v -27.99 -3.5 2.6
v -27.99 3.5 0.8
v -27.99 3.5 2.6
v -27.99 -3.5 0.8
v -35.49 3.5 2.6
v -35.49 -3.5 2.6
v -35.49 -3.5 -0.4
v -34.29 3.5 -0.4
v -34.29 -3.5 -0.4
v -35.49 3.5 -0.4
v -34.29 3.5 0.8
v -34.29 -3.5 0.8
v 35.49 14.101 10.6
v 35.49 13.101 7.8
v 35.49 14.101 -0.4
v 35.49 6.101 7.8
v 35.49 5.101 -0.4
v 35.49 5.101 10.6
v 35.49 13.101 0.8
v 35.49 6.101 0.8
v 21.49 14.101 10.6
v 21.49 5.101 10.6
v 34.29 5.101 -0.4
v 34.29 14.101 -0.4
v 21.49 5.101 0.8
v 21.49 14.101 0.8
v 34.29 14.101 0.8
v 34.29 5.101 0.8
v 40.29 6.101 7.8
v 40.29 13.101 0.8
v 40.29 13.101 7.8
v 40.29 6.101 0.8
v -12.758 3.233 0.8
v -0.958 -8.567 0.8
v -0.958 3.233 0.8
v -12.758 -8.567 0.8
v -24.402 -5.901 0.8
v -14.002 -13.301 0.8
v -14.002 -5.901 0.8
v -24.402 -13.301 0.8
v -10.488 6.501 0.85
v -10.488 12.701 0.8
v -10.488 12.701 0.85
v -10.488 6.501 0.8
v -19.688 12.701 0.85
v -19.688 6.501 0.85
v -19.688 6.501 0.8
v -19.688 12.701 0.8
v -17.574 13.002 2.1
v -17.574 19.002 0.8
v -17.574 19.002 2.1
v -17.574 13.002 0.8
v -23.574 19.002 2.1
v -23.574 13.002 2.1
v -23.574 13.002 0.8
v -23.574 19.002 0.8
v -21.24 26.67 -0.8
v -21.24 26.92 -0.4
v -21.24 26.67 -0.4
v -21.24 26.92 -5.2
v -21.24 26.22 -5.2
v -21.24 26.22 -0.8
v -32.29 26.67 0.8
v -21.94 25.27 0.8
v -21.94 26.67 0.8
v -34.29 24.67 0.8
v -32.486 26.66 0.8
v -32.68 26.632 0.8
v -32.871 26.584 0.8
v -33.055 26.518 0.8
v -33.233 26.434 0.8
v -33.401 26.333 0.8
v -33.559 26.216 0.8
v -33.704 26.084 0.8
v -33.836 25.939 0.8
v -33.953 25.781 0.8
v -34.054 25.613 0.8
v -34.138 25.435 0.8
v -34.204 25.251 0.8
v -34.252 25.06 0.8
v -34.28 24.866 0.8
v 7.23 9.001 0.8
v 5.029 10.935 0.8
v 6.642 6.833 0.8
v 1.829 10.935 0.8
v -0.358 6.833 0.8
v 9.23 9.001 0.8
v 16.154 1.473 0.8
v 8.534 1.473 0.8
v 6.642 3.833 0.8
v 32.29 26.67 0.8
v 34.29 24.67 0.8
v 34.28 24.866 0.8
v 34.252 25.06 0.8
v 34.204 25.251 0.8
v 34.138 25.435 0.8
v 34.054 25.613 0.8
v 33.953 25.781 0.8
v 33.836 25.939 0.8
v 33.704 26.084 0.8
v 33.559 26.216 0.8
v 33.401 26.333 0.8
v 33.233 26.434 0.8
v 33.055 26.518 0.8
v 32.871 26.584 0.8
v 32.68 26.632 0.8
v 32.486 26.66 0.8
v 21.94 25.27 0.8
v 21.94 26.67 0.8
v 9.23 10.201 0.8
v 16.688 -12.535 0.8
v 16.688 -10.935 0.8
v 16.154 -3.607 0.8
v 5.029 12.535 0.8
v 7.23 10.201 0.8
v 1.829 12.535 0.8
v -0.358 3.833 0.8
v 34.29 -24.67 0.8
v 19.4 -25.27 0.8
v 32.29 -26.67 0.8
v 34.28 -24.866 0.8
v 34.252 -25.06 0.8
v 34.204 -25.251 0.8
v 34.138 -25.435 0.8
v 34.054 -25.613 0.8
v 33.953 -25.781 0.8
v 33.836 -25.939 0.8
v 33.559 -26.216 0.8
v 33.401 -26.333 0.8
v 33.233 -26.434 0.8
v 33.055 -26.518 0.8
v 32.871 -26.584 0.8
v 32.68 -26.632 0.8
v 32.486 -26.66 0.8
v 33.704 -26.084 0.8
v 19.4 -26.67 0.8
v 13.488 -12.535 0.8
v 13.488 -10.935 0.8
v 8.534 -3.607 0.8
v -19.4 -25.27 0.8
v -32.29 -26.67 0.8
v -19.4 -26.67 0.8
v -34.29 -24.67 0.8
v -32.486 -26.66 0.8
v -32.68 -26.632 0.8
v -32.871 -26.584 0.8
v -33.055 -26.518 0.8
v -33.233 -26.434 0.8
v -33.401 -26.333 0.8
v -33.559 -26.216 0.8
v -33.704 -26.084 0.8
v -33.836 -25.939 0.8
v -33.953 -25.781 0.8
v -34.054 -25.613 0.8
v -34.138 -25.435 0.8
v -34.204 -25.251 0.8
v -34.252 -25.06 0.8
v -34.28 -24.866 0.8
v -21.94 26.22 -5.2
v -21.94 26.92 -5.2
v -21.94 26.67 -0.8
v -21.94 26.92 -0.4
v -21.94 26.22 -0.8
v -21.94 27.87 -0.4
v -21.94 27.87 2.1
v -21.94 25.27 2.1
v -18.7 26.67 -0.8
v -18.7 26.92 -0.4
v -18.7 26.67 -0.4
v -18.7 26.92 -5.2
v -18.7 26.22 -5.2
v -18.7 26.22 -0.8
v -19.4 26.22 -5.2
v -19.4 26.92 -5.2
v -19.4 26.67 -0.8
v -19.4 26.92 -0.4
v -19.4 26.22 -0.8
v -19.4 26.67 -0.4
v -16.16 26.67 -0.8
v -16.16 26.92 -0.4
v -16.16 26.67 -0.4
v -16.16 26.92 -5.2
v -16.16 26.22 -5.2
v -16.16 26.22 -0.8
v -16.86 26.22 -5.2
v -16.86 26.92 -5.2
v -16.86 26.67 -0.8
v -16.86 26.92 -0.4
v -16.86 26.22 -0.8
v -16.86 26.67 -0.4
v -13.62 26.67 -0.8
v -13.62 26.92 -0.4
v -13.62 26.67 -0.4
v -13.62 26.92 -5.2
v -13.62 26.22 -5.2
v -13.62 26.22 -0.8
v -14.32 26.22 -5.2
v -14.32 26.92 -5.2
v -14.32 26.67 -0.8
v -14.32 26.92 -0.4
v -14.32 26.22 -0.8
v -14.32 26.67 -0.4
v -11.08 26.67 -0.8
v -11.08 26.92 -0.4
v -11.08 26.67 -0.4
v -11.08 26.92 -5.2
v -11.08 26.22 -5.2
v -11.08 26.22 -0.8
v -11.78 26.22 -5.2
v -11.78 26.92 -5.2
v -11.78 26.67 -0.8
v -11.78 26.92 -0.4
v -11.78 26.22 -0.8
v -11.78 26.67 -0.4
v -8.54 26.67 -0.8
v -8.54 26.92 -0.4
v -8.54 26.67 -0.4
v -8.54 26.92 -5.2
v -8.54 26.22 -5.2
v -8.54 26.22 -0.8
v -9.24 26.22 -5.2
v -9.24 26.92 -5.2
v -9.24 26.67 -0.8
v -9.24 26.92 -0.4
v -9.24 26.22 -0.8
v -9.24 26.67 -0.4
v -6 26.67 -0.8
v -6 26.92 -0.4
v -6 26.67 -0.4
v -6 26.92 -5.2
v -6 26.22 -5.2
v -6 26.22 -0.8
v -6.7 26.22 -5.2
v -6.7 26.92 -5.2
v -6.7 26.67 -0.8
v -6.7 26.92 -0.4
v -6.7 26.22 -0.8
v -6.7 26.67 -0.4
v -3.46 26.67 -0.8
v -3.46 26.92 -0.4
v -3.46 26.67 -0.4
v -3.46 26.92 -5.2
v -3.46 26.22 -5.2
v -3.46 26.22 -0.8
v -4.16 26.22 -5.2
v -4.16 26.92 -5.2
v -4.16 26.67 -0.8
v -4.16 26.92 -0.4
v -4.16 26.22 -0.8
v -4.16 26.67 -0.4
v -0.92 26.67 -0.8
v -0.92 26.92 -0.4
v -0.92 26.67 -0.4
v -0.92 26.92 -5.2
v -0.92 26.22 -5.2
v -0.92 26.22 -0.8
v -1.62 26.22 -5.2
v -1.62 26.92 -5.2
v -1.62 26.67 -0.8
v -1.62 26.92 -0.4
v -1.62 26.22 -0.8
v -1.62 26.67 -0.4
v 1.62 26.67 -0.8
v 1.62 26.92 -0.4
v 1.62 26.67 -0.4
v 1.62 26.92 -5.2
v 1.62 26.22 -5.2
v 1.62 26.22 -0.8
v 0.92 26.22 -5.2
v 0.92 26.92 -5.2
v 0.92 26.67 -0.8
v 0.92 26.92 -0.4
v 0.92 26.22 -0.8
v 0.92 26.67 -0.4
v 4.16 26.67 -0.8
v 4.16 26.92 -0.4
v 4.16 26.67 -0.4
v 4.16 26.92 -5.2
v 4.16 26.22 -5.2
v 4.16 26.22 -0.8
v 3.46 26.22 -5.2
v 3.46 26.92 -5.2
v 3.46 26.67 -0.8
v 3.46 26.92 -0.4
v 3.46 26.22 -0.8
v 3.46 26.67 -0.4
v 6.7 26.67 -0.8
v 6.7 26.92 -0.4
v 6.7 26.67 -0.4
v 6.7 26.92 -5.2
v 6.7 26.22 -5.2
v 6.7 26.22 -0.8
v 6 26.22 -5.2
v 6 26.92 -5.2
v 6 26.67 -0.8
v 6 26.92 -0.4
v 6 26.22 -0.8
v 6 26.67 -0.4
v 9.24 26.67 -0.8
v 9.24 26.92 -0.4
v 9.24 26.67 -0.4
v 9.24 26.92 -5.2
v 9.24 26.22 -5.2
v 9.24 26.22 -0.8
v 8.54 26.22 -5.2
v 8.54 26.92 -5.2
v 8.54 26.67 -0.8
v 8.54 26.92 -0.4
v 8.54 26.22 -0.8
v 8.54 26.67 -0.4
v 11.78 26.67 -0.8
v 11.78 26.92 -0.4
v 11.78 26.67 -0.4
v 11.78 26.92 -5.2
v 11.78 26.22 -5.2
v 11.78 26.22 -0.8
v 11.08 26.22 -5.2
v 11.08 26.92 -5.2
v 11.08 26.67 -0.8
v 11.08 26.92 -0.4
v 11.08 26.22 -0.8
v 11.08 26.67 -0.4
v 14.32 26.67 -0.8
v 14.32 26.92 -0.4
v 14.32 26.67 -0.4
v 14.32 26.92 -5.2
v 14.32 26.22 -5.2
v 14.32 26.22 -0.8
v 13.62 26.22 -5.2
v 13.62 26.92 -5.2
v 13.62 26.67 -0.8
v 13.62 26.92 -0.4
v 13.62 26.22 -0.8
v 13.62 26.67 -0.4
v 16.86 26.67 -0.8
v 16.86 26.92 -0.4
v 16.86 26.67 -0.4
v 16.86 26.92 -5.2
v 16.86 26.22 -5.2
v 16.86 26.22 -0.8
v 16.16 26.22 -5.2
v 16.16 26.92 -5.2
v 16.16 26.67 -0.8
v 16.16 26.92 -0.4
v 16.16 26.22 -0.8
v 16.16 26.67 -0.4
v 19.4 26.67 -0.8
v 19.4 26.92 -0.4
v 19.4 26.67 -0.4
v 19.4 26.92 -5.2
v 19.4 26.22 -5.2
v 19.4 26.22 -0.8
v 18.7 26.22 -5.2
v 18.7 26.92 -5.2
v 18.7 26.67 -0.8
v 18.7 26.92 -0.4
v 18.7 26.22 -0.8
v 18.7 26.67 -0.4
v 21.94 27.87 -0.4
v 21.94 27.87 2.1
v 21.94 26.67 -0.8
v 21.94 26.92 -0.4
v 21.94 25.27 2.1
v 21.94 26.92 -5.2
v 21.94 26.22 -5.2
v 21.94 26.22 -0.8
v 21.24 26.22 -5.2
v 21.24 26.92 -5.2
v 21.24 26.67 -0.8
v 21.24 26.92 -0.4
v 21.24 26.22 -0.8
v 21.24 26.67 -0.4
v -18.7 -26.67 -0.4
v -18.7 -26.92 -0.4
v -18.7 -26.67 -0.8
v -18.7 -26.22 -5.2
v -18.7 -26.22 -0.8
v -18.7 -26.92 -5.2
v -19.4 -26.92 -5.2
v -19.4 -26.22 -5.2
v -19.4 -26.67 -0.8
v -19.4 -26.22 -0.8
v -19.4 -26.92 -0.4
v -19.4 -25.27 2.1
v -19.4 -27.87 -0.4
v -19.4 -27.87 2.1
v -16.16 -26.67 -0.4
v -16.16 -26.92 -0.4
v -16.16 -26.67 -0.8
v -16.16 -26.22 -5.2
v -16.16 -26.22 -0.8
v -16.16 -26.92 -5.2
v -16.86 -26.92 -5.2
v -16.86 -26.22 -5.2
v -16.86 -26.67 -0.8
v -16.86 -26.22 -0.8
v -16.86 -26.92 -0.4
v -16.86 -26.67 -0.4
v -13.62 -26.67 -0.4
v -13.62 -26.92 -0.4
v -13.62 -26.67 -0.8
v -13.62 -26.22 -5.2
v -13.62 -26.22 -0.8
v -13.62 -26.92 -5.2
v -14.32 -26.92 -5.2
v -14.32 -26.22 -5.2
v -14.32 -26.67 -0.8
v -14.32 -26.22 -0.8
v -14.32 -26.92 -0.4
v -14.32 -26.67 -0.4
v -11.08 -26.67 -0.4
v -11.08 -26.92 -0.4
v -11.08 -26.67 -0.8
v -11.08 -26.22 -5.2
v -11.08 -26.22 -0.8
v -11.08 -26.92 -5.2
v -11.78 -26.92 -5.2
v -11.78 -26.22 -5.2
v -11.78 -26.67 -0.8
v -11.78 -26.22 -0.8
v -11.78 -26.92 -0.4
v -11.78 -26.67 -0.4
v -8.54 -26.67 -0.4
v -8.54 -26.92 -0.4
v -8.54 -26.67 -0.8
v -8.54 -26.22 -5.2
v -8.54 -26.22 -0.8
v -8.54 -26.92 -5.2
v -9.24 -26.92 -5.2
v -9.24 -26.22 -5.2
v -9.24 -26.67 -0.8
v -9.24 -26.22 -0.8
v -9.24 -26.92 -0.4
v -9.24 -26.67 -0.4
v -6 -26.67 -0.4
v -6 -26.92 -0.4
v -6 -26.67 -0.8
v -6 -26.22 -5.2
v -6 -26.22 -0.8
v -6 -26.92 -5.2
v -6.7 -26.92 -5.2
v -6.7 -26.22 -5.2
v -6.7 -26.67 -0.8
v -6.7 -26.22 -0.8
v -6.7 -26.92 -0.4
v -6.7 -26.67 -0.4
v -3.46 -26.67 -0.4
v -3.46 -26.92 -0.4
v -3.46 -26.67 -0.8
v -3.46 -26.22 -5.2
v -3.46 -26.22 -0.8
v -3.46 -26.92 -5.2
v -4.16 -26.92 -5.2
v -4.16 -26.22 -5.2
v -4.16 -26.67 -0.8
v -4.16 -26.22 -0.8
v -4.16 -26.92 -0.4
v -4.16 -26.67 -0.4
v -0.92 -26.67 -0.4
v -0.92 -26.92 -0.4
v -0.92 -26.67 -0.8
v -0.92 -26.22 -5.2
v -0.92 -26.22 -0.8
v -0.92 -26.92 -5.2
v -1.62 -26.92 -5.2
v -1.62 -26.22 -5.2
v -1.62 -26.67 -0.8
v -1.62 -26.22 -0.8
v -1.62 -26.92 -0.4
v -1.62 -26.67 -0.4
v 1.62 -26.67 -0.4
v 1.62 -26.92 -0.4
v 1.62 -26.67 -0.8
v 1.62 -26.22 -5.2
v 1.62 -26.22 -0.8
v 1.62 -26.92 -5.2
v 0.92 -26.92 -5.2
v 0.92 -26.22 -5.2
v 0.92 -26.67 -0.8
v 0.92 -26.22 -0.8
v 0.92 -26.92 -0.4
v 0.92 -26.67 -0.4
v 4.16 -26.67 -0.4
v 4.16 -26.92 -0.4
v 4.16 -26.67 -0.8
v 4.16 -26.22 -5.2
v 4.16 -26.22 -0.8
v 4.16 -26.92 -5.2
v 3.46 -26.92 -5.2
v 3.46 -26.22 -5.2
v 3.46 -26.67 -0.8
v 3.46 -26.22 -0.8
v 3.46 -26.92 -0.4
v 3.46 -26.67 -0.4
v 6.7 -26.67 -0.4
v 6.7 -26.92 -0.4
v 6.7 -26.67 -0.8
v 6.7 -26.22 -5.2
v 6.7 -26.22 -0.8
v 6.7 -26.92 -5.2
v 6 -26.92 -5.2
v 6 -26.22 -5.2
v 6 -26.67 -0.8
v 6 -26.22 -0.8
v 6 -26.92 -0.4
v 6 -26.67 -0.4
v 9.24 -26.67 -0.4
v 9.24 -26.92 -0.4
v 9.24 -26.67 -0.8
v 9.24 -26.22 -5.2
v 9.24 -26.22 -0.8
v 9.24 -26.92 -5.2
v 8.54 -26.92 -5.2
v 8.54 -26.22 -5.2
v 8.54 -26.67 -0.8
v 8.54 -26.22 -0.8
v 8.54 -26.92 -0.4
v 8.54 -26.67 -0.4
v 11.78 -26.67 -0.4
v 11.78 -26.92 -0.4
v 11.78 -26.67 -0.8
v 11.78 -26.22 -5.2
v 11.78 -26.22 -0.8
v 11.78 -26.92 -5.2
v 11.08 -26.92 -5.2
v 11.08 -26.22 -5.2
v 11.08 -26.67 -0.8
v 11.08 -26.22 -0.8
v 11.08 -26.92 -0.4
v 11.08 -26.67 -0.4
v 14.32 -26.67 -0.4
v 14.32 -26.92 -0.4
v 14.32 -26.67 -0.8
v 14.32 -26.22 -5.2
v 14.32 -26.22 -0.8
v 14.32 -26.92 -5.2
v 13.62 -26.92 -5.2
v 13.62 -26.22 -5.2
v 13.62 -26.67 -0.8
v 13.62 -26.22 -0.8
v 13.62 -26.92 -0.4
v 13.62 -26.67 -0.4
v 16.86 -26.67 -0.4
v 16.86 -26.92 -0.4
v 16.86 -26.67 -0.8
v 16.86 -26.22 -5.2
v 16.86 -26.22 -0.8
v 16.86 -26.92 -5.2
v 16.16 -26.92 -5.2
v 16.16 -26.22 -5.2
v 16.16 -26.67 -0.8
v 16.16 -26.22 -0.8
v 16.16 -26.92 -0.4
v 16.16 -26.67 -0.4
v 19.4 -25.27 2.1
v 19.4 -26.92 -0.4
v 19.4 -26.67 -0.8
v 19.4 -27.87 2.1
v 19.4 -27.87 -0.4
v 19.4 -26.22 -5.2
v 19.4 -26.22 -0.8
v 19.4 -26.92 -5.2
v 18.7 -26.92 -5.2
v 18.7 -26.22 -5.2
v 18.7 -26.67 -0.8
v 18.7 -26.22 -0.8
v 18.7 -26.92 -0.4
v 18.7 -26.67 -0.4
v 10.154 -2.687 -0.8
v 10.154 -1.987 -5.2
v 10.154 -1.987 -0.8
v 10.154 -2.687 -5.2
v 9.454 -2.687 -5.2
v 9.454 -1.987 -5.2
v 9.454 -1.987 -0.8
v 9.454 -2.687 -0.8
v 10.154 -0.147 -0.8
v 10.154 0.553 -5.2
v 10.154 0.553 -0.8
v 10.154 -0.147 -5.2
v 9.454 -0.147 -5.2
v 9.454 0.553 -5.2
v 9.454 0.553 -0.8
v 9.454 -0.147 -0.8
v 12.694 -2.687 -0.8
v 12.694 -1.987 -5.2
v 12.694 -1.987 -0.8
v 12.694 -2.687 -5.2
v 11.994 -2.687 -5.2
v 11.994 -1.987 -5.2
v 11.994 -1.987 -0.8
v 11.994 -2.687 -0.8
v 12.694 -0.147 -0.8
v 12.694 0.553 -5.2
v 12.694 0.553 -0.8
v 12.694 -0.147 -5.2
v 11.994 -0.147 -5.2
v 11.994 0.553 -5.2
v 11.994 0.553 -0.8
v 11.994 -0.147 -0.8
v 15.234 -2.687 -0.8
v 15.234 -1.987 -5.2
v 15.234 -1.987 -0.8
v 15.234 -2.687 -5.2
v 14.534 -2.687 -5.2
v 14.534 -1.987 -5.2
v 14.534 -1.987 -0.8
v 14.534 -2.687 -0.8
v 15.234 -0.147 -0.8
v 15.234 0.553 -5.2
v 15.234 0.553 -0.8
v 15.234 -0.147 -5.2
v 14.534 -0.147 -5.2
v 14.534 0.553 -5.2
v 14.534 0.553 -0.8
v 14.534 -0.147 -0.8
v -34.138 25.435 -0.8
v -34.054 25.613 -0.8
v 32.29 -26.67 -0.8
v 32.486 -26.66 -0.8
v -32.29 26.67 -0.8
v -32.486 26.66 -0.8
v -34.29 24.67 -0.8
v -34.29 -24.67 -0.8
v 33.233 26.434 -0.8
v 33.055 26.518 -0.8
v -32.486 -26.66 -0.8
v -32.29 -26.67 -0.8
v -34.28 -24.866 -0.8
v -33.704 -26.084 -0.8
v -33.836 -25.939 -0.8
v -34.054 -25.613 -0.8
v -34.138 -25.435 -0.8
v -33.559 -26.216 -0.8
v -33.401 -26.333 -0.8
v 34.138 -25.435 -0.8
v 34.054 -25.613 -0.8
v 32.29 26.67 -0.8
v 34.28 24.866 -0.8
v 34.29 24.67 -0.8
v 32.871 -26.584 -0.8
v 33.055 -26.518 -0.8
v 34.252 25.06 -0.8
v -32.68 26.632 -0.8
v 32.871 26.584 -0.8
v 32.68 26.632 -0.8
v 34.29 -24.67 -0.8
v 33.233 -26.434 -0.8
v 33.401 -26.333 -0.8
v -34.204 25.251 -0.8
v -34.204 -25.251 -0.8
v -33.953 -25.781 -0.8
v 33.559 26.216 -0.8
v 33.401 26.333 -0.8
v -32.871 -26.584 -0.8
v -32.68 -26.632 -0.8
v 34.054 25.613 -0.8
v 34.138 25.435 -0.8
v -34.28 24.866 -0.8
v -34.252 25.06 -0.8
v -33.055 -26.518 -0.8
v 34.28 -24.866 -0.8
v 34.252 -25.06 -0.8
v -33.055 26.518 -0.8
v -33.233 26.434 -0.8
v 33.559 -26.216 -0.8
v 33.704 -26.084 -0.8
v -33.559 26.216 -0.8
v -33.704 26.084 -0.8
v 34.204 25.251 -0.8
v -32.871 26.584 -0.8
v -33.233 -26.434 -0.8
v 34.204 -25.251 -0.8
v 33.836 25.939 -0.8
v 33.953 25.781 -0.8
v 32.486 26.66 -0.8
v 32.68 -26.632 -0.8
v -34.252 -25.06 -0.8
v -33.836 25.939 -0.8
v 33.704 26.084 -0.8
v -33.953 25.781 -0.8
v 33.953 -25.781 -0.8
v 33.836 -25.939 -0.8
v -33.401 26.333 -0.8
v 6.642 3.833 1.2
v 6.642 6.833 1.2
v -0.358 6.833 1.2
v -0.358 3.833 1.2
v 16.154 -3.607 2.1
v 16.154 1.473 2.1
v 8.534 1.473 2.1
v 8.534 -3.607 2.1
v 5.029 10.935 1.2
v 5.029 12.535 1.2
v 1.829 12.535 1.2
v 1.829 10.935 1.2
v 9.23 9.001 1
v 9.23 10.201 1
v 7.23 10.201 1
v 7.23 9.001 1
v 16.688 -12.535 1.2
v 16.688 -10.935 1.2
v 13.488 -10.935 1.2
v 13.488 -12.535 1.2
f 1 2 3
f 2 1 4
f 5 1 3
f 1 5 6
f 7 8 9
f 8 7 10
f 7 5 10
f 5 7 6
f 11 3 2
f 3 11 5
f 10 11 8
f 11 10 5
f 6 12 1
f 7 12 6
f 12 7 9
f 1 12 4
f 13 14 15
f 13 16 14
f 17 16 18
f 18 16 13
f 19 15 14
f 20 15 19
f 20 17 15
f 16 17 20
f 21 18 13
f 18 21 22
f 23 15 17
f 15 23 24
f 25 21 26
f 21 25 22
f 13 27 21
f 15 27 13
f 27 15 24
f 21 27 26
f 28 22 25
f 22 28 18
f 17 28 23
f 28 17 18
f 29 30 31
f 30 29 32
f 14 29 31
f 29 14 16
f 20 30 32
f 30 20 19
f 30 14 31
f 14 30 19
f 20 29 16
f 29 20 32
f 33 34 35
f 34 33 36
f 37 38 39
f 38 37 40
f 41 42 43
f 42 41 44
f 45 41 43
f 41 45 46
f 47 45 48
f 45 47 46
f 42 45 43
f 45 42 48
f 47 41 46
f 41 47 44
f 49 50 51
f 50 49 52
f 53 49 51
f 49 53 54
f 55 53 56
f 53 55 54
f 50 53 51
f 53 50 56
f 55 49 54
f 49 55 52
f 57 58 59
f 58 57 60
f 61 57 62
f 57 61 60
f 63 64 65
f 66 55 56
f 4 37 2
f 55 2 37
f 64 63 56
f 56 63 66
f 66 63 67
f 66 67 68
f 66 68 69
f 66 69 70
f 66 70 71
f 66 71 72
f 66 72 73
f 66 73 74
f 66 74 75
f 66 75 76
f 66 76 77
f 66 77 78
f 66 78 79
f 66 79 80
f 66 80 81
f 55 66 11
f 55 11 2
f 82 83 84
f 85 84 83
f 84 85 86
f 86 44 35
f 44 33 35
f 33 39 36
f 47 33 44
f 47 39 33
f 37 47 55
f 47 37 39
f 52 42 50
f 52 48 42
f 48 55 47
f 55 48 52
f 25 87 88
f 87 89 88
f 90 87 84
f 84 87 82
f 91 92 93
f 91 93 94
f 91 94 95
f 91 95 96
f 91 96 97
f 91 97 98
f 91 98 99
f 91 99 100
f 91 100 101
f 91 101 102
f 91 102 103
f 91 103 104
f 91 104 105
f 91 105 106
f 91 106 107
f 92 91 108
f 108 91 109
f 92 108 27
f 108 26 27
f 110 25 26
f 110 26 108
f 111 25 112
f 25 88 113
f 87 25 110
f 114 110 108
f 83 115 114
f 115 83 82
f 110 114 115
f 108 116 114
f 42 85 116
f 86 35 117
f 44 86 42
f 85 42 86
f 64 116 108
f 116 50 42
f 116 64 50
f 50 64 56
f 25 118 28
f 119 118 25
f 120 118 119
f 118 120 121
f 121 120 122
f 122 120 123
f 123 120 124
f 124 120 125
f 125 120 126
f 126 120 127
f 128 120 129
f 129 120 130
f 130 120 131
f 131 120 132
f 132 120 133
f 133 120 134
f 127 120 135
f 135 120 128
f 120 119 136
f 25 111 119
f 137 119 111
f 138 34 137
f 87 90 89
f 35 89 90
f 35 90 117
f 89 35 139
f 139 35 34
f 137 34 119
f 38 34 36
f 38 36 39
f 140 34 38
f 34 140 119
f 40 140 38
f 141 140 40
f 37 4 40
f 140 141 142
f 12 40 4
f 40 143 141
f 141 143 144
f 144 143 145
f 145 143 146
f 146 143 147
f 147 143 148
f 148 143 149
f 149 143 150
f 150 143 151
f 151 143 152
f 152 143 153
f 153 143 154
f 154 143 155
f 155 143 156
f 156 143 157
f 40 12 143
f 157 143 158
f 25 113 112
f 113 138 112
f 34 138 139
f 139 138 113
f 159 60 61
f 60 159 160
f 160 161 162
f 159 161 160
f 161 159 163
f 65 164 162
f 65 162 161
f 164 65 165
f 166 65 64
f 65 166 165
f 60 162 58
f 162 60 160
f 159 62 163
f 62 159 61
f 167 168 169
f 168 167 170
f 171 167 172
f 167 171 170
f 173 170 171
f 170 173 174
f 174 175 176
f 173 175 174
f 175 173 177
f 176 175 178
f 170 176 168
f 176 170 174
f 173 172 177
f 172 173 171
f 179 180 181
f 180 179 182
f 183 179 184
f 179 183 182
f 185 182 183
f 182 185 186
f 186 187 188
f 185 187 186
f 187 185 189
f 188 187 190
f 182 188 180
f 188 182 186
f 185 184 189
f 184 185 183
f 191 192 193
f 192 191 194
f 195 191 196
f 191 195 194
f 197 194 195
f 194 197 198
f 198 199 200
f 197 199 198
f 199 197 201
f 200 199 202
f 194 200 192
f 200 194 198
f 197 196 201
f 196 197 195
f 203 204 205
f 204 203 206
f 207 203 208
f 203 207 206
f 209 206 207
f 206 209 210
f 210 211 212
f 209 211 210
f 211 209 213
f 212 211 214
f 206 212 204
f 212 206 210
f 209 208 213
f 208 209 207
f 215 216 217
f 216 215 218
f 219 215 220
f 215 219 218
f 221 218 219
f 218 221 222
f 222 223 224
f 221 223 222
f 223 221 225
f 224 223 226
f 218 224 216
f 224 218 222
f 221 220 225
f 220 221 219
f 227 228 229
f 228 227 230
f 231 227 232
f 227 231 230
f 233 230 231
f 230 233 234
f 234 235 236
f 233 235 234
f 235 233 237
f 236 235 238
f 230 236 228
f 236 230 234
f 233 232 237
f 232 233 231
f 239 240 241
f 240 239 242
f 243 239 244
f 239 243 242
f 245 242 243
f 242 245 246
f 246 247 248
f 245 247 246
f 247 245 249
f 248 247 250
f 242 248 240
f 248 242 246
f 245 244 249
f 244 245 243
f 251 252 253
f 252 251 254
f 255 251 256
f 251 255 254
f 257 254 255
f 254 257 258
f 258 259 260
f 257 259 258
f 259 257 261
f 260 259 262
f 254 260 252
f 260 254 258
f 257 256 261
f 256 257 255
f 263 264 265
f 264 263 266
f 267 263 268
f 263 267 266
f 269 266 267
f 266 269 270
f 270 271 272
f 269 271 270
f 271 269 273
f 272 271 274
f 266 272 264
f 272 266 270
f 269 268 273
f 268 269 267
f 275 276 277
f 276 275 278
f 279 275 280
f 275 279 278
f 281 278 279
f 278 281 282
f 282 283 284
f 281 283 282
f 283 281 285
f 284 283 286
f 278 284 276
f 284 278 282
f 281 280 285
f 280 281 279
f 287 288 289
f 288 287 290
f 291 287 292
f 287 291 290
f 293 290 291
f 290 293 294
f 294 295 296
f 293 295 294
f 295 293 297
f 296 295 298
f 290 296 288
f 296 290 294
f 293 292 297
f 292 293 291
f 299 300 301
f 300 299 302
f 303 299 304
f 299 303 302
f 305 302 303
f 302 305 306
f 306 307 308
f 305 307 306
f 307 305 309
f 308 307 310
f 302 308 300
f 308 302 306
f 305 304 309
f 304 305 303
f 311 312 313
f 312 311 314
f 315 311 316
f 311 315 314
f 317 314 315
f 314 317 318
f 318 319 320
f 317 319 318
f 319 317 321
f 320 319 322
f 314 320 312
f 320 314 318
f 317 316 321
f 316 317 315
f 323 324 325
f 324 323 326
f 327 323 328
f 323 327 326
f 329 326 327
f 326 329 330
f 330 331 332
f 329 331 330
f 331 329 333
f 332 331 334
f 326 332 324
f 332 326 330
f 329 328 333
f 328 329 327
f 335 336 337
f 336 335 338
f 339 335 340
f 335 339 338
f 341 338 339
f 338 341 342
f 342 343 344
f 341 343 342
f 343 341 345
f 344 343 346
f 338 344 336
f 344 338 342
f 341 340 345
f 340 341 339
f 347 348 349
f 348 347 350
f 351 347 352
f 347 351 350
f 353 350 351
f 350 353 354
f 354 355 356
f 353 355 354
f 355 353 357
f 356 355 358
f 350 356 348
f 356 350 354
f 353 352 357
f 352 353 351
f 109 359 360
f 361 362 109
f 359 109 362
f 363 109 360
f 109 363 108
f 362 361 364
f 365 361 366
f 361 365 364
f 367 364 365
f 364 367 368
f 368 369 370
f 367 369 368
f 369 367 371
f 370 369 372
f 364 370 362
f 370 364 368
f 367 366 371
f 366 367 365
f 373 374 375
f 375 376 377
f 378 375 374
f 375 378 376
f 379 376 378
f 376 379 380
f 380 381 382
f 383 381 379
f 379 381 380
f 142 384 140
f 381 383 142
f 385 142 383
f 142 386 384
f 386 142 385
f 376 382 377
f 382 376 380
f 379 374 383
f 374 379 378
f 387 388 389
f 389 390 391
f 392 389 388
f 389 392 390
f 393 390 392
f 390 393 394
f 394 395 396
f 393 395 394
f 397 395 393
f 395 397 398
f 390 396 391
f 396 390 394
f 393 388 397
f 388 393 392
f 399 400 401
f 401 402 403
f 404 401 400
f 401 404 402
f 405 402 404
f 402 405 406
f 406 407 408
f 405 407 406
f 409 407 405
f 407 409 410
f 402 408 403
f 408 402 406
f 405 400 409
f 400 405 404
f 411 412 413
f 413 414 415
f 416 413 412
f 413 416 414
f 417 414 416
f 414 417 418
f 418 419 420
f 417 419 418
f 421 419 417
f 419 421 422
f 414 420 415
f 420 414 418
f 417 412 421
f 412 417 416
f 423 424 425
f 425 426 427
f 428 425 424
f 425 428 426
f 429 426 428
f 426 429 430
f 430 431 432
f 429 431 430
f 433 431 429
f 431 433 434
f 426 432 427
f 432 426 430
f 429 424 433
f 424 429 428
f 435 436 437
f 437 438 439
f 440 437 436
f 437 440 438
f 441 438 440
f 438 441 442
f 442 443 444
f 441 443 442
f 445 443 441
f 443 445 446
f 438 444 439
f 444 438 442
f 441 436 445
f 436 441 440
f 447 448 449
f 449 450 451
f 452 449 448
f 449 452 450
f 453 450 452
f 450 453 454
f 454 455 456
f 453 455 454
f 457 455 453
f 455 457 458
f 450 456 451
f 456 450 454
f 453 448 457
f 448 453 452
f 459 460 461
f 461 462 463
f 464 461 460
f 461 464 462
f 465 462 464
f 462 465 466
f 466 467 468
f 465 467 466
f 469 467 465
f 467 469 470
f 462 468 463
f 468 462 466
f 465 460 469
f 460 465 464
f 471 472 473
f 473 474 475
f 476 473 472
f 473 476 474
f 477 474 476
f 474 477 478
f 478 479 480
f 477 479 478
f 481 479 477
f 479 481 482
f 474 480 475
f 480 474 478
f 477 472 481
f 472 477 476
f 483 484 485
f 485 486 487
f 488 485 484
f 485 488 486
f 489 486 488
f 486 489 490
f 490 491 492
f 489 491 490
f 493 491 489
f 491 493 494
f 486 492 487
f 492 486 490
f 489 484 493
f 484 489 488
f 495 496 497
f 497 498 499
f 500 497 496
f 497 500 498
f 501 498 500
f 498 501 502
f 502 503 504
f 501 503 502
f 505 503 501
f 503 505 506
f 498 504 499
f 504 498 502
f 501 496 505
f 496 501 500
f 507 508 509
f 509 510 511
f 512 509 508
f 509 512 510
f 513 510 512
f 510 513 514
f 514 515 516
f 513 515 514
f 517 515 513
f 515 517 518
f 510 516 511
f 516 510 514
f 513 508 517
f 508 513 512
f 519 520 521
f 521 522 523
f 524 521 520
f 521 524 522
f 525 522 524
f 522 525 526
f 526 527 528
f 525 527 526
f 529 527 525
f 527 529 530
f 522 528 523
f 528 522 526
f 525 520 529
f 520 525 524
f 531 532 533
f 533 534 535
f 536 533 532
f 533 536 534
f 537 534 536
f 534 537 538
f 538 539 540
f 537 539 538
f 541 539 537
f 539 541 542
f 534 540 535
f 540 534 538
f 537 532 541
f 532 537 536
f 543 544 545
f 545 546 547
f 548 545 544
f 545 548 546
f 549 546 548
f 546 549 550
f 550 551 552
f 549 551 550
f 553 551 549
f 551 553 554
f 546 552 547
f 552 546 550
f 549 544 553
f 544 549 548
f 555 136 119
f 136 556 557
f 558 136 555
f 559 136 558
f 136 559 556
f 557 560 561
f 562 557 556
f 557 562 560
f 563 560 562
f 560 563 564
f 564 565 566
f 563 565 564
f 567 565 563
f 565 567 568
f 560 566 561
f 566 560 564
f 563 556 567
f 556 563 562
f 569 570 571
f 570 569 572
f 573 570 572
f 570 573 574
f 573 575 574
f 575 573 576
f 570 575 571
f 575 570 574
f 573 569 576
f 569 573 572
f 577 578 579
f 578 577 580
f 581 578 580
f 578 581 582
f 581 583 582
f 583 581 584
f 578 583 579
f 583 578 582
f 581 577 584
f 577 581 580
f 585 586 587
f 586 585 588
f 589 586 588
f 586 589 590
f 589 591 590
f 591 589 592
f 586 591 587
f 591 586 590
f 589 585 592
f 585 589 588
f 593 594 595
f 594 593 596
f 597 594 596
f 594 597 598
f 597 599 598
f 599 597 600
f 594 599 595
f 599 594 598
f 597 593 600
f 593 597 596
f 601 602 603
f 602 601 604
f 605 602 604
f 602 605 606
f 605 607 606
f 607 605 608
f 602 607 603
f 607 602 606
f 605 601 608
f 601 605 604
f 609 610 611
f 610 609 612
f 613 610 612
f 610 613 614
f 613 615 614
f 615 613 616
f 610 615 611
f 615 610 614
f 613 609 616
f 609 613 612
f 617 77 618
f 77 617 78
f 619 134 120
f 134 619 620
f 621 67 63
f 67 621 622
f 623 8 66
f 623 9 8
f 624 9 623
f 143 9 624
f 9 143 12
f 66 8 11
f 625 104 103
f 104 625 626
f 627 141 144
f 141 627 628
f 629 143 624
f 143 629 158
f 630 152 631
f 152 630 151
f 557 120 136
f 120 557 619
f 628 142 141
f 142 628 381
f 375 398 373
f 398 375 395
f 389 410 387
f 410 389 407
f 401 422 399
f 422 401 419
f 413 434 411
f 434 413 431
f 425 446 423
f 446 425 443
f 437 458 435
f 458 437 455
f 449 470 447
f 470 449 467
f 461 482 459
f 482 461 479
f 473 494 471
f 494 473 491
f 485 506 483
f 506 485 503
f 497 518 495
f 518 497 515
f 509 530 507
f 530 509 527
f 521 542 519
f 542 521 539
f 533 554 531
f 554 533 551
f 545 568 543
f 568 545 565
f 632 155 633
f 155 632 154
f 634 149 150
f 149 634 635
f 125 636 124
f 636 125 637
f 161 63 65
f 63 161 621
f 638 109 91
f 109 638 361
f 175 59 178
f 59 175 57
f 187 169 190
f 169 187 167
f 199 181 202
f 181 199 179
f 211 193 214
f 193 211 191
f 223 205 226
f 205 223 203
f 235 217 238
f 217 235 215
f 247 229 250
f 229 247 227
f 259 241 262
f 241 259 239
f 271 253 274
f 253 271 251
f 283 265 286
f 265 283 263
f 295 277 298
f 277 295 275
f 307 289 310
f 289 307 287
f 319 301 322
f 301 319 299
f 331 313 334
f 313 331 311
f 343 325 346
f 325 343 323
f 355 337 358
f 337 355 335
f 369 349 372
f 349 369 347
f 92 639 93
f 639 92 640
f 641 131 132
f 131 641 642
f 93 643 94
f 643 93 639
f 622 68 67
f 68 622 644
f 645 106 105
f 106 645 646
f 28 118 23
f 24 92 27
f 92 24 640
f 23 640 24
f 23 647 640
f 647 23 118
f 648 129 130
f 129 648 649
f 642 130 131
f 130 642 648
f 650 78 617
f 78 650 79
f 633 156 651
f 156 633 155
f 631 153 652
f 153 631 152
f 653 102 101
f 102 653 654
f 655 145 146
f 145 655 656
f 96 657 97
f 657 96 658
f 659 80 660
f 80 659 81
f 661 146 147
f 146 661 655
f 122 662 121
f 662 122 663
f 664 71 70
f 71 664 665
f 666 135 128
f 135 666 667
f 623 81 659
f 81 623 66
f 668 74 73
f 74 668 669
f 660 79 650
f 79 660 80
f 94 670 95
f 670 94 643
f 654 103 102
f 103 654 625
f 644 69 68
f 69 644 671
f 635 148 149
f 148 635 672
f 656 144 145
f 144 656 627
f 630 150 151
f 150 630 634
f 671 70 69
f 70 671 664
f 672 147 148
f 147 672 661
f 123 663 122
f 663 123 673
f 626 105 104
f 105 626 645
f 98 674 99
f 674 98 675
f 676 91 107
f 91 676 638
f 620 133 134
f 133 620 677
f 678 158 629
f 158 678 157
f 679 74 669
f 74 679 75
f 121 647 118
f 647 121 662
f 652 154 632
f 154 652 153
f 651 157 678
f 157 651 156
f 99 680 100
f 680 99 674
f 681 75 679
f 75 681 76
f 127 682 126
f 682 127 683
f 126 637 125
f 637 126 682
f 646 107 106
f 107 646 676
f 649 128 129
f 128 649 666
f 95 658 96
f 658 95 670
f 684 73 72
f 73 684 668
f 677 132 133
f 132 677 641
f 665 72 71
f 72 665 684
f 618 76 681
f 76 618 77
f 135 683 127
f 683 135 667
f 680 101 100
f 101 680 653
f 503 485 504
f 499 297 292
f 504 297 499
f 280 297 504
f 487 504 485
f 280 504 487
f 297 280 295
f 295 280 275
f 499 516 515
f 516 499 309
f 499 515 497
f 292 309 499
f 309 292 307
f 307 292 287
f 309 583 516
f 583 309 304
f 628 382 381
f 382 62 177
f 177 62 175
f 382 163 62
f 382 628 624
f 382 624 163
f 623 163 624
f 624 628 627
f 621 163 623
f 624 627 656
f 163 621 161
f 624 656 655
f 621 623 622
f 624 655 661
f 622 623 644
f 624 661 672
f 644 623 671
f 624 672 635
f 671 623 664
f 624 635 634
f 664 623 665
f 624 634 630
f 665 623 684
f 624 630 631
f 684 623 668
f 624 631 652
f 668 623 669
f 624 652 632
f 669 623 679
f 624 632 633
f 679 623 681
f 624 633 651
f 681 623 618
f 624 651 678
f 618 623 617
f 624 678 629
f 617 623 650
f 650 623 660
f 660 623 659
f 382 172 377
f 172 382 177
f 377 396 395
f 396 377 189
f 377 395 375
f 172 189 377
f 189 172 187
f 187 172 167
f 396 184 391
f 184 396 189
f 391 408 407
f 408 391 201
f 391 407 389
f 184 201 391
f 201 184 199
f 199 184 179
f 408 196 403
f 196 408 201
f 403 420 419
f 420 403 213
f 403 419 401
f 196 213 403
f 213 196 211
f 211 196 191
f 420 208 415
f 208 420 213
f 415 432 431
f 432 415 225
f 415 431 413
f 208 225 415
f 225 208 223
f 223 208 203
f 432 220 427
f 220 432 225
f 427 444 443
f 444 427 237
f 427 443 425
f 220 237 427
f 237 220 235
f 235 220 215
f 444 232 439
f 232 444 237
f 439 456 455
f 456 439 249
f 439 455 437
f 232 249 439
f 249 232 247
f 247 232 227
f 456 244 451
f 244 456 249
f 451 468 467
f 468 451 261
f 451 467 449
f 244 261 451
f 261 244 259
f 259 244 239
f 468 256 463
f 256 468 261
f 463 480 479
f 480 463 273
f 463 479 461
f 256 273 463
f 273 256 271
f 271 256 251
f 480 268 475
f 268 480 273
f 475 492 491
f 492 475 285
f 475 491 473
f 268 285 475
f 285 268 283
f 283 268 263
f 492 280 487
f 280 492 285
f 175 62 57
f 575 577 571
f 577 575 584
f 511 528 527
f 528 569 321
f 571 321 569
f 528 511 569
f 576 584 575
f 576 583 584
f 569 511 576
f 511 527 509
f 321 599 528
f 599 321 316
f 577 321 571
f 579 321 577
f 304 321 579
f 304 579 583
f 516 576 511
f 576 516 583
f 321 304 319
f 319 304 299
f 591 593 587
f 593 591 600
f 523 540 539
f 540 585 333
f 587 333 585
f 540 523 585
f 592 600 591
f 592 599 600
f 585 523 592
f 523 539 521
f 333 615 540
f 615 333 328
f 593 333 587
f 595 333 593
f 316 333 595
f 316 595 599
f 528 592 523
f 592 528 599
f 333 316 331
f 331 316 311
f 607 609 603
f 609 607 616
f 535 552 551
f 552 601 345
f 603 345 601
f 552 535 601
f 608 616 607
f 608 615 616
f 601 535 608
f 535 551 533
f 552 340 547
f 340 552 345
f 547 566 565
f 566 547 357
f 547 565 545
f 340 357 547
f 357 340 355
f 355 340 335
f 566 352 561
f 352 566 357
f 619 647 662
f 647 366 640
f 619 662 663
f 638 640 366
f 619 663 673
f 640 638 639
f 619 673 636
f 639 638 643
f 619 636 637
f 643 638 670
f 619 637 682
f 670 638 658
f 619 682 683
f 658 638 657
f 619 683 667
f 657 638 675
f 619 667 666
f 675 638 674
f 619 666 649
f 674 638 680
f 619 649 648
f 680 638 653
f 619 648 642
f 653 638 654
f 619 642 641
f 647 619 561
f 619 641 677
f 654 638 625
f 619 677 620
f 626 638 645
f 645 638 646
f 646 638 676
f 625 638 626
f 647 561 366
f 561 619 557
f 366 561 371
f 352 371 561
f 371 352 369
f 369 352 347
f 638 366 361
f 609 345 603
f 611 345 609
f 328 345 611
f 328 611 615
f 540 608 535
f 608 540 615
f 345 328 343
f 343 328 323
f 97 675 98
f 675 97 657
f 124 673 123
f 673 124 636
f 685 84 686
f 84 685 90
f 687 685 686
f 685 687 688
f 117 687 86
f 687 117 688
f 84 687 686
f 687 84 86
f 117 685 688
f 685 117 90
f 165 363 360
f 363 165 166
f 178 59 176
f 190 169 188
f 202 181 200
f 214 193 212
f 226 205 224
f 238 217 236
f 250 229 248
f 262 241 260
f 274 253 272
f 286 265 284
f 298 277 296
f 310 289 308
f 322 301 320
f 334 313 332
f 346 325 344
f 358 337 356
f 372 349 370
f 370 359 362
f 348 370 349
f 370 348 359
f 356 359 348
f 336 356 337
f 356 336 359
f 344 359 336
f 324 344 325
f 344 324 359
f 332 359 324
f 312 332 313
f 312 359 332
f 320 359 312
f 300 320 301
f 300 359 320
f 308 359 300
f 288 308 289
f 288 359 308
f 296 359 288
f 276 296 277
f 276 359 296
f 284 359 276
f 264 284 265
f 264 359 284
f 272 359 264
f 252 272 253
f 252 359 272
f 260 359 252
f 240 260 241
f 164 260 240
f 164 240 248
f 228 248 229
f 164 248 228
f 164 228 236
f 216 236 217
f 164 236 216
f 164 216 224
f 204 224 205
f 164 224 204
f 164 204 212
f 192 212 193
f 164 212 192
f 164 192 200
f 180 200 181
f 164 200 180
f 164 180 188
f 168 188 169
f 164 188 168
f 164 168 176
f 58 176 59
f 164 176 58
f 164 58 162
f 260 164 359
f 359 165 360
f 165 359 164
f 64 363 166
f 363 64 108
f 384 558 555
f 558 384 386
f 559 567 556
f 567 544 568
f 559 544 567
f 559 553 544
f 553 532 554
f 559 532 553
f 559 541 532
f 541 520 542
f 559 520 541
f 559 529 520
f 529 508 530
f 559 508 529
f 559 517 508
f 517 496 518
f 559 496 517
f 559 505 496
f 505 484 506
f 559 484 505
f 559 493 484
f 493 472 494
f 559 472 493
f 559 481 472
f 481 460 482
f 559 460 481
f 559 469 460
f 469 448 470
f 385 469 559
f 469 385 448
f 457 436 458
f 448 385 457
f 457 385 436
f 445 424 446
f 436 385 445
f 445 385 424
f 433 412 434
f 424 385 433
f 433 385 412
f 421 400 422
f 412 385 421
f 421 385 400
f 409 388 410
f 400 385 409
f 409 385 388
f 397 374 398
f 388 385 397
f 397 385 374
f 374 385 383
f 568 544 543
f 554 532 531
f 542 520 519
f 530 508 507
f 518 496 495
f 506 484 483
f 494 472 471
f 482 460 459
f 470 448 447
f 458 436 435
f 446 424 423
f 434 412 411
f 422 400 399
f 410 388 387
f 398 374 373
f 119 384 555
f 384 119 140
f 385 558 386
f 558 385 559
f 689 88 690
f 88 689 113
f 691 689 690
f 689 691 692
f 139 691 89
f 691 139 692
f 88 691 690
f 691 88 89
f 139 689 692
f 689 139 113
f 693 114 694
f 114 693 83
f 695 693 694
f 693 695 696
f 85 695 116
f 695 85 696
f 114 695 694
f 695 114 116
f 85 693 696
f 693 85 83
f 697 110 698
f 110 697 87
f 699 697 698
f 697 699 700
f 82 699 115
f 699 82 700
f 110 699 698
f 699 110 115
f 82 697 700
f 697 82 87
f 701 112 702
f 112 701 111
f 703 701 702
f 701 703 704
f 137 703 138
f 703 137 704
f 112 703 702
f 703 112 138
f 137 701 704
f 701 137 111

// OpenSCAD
// Microcontroller development board (Arduino Leonardo-style approximation)
// Target PCB size: 68.58mm x 53.34mm x 1.6mm
// Structural fixes:
// - Ensure header pins are NOT floating: extend pins into PCB and overlap 1-2mm
// - Ensure all parts are in a single union() and physically intersect

length = 68.58;     // X
width  = 53.34;     // Y
thickness = 1.6;    // Z

$fn = 64;

// Overlap to guarantee manifold unions (1-2mm as required)
overlap = 1.2;

// ---------- Helpers ----------
module rounded_rect_2d(l, w, r) {
    rr = min(r, min(l, w)/2 - 0.01);
    offset(r=rr) square([l - 2*rr, w - 2*rr], center=true);
}

module pcb_solid(l=length, w=width, t=thickness, corner_r=2.0) {
    linear_extrude(height=t, center=true, convexity=10)
        rounded_rect_2d(l, w, corner_r);
}

module chip_qfp(body=[10,10,1.2], lead=0.8, lead_t=0.35) {
    union() {
        cube(body, center=true);
        translate([0,0,-(body[2]/2 + lead_t/2 - overlap)])
            cube([body[0] + 2*lead, body[1] + 2*lead, lead_t], center=true);
    }
}

module ic_soic(body=[9,6,1.2], lead=0.6, lead_t=0.35) {
    union() {
        cube(body, center=true);
        translate([0,0,-(body[2]/2 + lead_t/2 - overlap)])
            cube([body[0] + 2*lead, body[1] + 2*lead, lead_t], center=true);
    }
}

module header_row(pins=10, pitch=2.54, pin=[0.7,0.7,6], base_h=2.5) {
    // One-piece header: plastic base + pins fused
    row_l = (pins-1)*pitch + pin[0];
    union() {
        cube([row_l, 2.6, base_h], center=true);
        for (i=[0:pins-1]) {
            x = -row_l/2 + pin[0]/2 + i*pitch;
            translate([x, 0, -(base_h/2 + pin[2]/2 - overlap)])
                cube(pin, center=true);
        }
    }
}

module usb_micro_b(conn=[7.5,7.0,3.0], tongue=[5.5,1.0,1.0]) {
    union() {
        cube(conn, center=true);
        translate([0, 0, -(conn[2]/2 - tongue[2]/2 - overlap)])
            cube(tongue, center=true);
    }
}

module barrel_jack(body=[14,9,11], nose=[6,7,7]) {
    union() {
        cube(body, center=true);
        translate([body[0]/2 + nose[0]/2 - overlap, 0, -(body[2]/2 - nose[2]/2 - overlap)])
            cube(nose, center=true);
    }
}

module reset_button(body=[6,6,2.5], plunger=[3.2,3.2,1.2]) {
    union() {
        cube(body, center=true);
        translate([0,0, body[2]/2 + plunger[2]/2 - overlap])
            cube(plunger, center=true);
    }
}

module led_0603(size=[1.6,0.8,0.6]) {
    cube(size, center=true);
}

// ---------- Assembly ----------
module assembly() {
    pcb_top = thickness/2;

    // Ensure header pins actually intersect the PCB (fix floating/gap):
    // Place header base on top of PCB with overlap, and extend pins downward so
    // their top is inside the header base and their bottom penetrates the PCB.
    header_base_h = 2.5;
    header_pin = [0.7,0.7,6];

    // Z center for header base: bottom of base goes into PCB by 'overlap'
    header_base_zc = pcb_top + header_base_h/2 - overlap;

    // Z center for pins: make pin top penetrate into base by 'overlap'
    // pin_top_z = (base_bottom_z) + overlap
    // base_bottom_z = header_base_zc - header_base_h/2
    // pin_center_z = pin_top_z - pin_h/2
    base_bottom_z = header_base_zc - header_base_h/2;
    pin_zc = (base_bottom_z + overlap) - header_pin[2]/2;

    union() {
        // PCB
        color([0.0, 0.4, 0.2]) pcb_solid();

        // --- Major components (approximate Leonardo-style layout) ---

        // USB connector on left edge, centered in Y
        usb = [7.5, 7.0, 3.0];
        usb_zc = pcb_top + usb[2]/2 - overlap;
        usb_xc = -length/2 + usb[0]/2 - overlap;
        translate([usb_xc, 0, usb_zc])
            color([0.75,0.75,0.75]) usb_micro_b(conn=usb, tongue=[5.5,1.0,1.0]);

        // DC barrel jack on right edge, slightly above center in Y
        jack_body = [14, 9, 11];
        jack_zc = pcb_top + jack_body[2]/2 - overlap;
        jack_xc = length/2 - jack_body[0]/2 + overlap;
        jack_yc = width*0.18;
        translate([jack_xc, jack_yc, jack_zc])
            color([0.1,0.1,0.1]) barrel_jack(body=jack_body, nose=[6,7,7]);

        // Main MCU (ATmega32u4-ish) near center-left
        mcu_body = [10,10,1.2];
        mcu_zc = pcb_top + mcu_body[2]/2 - overlap;
        mcu_xc = -length*0.10;
        mcu_yc = -width*0.05;
        translate([mcu_xc, mcu_yc, mcu_zc])
            color([0.15,0.15,0.15]) chip_qfp(body=mcu_body, lead=0.9, lead_t=0.35);

        // USB interface / regulator ICs (SOIC) near USB side
        soic1 = [9,6,1.2];
        soic_zc = pcb_top + soic1[2]/2 - overlap;
        translate([-length*0.28, -width*0.18, soic_zc])
            color([0.15,0.15,0.15]) ic_soic(body=soic1, lead=0.7, lead_t=0.35);

        translate([-length*0.22, width*0.18, soic_zc])
            color([0.15,0.15,0.15]) ic_soic(body=[8,5,1.1], lead=0.6, lead_t=0.35);

        // Crystal/resonator near MCU
        xtal = [7,3,1.6];
        xtal_zc = pcb_top + xtal[2]/2 - overlap;
        translate([mcu_xc + 10, mcu_yc + 8, xtal_zc])
            color([0.7,0.7,0.7]) cube(xtal, center=true);

        // Reset button near top-left quadrant
        btn = [6,6,2.5];
        btn_zc = pcb_top + btn[2]/2 - overlap;
        translate([-length*0.30, width*0.30, btn_zc])
            color([0.2,0.2,0.2]) reset_button(body=btn, plunger=[3.2,3.2,1.2]);

        // Power LED near USB
        led = [1.6,0.8,0.6];
        led_zc = pcb_top + led[2]/2 - overlap;
        translate([usb_xc + usb[0]*0.9, -width*0.22, led_zc])
            color([0.9,0.1,0.1]) led_0603(size=led);

        // --- Headers (approximate Arduino footprint) ---
        // Long header along top edge (digital pins)
        top_pins = 18;
        top_pitch = 2.54;
        top_row_l = (top_pins-1)*top_pitch + header_pin[0];
        top_yc = width/2 - 2.6/2 + overlap;

        // Base (fused to PCB)
        translate([0, top_yc, header_base_zc])
            color([0.05,0.05,0.05]) cube([top_row_l, 2.6, header_base_h], center=true);

        // Pins (explicitly placed so they penetrate PCB and overlap into base)
        for (i=[0:top_pins-1]) {
            x = -top_row_l/2 + header_pin[0]/2 + i*top_pitch;
            translate([x, top_yc, pin_zc])
                color([0.05,0.05,0.05]) cube(header_pin, center=true);
        }

        // Long header along bottom edge (analog/power)
        bot_pins = 16;
        bot_pitch = 2.54;
        bot_row_l = (bot_pins-1)*bot_pitch + header_pin[0];
        bot_yc = -width/2 + 2.6/2 - overlap;

        translate([0, bot_yc, header_base_zc])
            color([0.05,0.05,0.05]) cube([bot_row_l, 2.6, header_base_h], center=true);

        for (i=[0:bot_pins-1]) {
            x = -bot_row_l/2 + header_pin[0]/2 + i*bot_pitch;
            translate([x, bot_yc, pin_zc])
                color([0.05,0.05,0.05]) cube(header_pin, center=true);
        }

        // 2x3 ICSP header near center-right (ensure pins overlap into base and PCB)
        icsp_base = [7.62, 5.08, 2.5];
        icsp_pin = [0.7,0.7,6];

        icsp_base_zc = pcb_top + icsp_base[2]/2 - overlap;
        icsp_base_bottom_z = icsp_base_zc - icsp_base[2]/2;
        icsp_pin_zc = (icsp_base_bottom_z + overlap) - icsp_pin[2]/2;

        icsp_xc = length*0.18;
        icsp_yc = -width*0.02;

        translate([icsp_xc, icsp_yc, icsp_base_zc])
            color([0.05,0.05,0.05]) cube(icsp_base, center=true);

        for (ix=[-1:1]) for (iy=[-0.5,0.5]) {
            translate([icsp_xc + ix*2.54, icsp_yc + iy*2.54, icsp_pin_zc])
                color([0.8,0.8,0.8]) cube(icsp_pin, center=true);
        }

        // A few capacitors as small blocks (fused)
        cap1 = [3.2,1.6,1.6];
        cap_zc = pcb_top + cap1[2]/2 - overlap;
        translate([length*0.05, width*0.22, cap_zc])
            color([0.75,0.6,0.2]) cube(cap1, center=true);
        translate([length*0.12, width*0.18, cap_zc])
            color([0.75,0.6,0.2]) cube([2.0,1.2,1.2], center=true);
        translate([length*0.22, -width*0.22, cap_zc])
            color([0.75,0.6,0.2]) cube([3.2,1.6,1.6], center=true);
    }
}

assembly();
